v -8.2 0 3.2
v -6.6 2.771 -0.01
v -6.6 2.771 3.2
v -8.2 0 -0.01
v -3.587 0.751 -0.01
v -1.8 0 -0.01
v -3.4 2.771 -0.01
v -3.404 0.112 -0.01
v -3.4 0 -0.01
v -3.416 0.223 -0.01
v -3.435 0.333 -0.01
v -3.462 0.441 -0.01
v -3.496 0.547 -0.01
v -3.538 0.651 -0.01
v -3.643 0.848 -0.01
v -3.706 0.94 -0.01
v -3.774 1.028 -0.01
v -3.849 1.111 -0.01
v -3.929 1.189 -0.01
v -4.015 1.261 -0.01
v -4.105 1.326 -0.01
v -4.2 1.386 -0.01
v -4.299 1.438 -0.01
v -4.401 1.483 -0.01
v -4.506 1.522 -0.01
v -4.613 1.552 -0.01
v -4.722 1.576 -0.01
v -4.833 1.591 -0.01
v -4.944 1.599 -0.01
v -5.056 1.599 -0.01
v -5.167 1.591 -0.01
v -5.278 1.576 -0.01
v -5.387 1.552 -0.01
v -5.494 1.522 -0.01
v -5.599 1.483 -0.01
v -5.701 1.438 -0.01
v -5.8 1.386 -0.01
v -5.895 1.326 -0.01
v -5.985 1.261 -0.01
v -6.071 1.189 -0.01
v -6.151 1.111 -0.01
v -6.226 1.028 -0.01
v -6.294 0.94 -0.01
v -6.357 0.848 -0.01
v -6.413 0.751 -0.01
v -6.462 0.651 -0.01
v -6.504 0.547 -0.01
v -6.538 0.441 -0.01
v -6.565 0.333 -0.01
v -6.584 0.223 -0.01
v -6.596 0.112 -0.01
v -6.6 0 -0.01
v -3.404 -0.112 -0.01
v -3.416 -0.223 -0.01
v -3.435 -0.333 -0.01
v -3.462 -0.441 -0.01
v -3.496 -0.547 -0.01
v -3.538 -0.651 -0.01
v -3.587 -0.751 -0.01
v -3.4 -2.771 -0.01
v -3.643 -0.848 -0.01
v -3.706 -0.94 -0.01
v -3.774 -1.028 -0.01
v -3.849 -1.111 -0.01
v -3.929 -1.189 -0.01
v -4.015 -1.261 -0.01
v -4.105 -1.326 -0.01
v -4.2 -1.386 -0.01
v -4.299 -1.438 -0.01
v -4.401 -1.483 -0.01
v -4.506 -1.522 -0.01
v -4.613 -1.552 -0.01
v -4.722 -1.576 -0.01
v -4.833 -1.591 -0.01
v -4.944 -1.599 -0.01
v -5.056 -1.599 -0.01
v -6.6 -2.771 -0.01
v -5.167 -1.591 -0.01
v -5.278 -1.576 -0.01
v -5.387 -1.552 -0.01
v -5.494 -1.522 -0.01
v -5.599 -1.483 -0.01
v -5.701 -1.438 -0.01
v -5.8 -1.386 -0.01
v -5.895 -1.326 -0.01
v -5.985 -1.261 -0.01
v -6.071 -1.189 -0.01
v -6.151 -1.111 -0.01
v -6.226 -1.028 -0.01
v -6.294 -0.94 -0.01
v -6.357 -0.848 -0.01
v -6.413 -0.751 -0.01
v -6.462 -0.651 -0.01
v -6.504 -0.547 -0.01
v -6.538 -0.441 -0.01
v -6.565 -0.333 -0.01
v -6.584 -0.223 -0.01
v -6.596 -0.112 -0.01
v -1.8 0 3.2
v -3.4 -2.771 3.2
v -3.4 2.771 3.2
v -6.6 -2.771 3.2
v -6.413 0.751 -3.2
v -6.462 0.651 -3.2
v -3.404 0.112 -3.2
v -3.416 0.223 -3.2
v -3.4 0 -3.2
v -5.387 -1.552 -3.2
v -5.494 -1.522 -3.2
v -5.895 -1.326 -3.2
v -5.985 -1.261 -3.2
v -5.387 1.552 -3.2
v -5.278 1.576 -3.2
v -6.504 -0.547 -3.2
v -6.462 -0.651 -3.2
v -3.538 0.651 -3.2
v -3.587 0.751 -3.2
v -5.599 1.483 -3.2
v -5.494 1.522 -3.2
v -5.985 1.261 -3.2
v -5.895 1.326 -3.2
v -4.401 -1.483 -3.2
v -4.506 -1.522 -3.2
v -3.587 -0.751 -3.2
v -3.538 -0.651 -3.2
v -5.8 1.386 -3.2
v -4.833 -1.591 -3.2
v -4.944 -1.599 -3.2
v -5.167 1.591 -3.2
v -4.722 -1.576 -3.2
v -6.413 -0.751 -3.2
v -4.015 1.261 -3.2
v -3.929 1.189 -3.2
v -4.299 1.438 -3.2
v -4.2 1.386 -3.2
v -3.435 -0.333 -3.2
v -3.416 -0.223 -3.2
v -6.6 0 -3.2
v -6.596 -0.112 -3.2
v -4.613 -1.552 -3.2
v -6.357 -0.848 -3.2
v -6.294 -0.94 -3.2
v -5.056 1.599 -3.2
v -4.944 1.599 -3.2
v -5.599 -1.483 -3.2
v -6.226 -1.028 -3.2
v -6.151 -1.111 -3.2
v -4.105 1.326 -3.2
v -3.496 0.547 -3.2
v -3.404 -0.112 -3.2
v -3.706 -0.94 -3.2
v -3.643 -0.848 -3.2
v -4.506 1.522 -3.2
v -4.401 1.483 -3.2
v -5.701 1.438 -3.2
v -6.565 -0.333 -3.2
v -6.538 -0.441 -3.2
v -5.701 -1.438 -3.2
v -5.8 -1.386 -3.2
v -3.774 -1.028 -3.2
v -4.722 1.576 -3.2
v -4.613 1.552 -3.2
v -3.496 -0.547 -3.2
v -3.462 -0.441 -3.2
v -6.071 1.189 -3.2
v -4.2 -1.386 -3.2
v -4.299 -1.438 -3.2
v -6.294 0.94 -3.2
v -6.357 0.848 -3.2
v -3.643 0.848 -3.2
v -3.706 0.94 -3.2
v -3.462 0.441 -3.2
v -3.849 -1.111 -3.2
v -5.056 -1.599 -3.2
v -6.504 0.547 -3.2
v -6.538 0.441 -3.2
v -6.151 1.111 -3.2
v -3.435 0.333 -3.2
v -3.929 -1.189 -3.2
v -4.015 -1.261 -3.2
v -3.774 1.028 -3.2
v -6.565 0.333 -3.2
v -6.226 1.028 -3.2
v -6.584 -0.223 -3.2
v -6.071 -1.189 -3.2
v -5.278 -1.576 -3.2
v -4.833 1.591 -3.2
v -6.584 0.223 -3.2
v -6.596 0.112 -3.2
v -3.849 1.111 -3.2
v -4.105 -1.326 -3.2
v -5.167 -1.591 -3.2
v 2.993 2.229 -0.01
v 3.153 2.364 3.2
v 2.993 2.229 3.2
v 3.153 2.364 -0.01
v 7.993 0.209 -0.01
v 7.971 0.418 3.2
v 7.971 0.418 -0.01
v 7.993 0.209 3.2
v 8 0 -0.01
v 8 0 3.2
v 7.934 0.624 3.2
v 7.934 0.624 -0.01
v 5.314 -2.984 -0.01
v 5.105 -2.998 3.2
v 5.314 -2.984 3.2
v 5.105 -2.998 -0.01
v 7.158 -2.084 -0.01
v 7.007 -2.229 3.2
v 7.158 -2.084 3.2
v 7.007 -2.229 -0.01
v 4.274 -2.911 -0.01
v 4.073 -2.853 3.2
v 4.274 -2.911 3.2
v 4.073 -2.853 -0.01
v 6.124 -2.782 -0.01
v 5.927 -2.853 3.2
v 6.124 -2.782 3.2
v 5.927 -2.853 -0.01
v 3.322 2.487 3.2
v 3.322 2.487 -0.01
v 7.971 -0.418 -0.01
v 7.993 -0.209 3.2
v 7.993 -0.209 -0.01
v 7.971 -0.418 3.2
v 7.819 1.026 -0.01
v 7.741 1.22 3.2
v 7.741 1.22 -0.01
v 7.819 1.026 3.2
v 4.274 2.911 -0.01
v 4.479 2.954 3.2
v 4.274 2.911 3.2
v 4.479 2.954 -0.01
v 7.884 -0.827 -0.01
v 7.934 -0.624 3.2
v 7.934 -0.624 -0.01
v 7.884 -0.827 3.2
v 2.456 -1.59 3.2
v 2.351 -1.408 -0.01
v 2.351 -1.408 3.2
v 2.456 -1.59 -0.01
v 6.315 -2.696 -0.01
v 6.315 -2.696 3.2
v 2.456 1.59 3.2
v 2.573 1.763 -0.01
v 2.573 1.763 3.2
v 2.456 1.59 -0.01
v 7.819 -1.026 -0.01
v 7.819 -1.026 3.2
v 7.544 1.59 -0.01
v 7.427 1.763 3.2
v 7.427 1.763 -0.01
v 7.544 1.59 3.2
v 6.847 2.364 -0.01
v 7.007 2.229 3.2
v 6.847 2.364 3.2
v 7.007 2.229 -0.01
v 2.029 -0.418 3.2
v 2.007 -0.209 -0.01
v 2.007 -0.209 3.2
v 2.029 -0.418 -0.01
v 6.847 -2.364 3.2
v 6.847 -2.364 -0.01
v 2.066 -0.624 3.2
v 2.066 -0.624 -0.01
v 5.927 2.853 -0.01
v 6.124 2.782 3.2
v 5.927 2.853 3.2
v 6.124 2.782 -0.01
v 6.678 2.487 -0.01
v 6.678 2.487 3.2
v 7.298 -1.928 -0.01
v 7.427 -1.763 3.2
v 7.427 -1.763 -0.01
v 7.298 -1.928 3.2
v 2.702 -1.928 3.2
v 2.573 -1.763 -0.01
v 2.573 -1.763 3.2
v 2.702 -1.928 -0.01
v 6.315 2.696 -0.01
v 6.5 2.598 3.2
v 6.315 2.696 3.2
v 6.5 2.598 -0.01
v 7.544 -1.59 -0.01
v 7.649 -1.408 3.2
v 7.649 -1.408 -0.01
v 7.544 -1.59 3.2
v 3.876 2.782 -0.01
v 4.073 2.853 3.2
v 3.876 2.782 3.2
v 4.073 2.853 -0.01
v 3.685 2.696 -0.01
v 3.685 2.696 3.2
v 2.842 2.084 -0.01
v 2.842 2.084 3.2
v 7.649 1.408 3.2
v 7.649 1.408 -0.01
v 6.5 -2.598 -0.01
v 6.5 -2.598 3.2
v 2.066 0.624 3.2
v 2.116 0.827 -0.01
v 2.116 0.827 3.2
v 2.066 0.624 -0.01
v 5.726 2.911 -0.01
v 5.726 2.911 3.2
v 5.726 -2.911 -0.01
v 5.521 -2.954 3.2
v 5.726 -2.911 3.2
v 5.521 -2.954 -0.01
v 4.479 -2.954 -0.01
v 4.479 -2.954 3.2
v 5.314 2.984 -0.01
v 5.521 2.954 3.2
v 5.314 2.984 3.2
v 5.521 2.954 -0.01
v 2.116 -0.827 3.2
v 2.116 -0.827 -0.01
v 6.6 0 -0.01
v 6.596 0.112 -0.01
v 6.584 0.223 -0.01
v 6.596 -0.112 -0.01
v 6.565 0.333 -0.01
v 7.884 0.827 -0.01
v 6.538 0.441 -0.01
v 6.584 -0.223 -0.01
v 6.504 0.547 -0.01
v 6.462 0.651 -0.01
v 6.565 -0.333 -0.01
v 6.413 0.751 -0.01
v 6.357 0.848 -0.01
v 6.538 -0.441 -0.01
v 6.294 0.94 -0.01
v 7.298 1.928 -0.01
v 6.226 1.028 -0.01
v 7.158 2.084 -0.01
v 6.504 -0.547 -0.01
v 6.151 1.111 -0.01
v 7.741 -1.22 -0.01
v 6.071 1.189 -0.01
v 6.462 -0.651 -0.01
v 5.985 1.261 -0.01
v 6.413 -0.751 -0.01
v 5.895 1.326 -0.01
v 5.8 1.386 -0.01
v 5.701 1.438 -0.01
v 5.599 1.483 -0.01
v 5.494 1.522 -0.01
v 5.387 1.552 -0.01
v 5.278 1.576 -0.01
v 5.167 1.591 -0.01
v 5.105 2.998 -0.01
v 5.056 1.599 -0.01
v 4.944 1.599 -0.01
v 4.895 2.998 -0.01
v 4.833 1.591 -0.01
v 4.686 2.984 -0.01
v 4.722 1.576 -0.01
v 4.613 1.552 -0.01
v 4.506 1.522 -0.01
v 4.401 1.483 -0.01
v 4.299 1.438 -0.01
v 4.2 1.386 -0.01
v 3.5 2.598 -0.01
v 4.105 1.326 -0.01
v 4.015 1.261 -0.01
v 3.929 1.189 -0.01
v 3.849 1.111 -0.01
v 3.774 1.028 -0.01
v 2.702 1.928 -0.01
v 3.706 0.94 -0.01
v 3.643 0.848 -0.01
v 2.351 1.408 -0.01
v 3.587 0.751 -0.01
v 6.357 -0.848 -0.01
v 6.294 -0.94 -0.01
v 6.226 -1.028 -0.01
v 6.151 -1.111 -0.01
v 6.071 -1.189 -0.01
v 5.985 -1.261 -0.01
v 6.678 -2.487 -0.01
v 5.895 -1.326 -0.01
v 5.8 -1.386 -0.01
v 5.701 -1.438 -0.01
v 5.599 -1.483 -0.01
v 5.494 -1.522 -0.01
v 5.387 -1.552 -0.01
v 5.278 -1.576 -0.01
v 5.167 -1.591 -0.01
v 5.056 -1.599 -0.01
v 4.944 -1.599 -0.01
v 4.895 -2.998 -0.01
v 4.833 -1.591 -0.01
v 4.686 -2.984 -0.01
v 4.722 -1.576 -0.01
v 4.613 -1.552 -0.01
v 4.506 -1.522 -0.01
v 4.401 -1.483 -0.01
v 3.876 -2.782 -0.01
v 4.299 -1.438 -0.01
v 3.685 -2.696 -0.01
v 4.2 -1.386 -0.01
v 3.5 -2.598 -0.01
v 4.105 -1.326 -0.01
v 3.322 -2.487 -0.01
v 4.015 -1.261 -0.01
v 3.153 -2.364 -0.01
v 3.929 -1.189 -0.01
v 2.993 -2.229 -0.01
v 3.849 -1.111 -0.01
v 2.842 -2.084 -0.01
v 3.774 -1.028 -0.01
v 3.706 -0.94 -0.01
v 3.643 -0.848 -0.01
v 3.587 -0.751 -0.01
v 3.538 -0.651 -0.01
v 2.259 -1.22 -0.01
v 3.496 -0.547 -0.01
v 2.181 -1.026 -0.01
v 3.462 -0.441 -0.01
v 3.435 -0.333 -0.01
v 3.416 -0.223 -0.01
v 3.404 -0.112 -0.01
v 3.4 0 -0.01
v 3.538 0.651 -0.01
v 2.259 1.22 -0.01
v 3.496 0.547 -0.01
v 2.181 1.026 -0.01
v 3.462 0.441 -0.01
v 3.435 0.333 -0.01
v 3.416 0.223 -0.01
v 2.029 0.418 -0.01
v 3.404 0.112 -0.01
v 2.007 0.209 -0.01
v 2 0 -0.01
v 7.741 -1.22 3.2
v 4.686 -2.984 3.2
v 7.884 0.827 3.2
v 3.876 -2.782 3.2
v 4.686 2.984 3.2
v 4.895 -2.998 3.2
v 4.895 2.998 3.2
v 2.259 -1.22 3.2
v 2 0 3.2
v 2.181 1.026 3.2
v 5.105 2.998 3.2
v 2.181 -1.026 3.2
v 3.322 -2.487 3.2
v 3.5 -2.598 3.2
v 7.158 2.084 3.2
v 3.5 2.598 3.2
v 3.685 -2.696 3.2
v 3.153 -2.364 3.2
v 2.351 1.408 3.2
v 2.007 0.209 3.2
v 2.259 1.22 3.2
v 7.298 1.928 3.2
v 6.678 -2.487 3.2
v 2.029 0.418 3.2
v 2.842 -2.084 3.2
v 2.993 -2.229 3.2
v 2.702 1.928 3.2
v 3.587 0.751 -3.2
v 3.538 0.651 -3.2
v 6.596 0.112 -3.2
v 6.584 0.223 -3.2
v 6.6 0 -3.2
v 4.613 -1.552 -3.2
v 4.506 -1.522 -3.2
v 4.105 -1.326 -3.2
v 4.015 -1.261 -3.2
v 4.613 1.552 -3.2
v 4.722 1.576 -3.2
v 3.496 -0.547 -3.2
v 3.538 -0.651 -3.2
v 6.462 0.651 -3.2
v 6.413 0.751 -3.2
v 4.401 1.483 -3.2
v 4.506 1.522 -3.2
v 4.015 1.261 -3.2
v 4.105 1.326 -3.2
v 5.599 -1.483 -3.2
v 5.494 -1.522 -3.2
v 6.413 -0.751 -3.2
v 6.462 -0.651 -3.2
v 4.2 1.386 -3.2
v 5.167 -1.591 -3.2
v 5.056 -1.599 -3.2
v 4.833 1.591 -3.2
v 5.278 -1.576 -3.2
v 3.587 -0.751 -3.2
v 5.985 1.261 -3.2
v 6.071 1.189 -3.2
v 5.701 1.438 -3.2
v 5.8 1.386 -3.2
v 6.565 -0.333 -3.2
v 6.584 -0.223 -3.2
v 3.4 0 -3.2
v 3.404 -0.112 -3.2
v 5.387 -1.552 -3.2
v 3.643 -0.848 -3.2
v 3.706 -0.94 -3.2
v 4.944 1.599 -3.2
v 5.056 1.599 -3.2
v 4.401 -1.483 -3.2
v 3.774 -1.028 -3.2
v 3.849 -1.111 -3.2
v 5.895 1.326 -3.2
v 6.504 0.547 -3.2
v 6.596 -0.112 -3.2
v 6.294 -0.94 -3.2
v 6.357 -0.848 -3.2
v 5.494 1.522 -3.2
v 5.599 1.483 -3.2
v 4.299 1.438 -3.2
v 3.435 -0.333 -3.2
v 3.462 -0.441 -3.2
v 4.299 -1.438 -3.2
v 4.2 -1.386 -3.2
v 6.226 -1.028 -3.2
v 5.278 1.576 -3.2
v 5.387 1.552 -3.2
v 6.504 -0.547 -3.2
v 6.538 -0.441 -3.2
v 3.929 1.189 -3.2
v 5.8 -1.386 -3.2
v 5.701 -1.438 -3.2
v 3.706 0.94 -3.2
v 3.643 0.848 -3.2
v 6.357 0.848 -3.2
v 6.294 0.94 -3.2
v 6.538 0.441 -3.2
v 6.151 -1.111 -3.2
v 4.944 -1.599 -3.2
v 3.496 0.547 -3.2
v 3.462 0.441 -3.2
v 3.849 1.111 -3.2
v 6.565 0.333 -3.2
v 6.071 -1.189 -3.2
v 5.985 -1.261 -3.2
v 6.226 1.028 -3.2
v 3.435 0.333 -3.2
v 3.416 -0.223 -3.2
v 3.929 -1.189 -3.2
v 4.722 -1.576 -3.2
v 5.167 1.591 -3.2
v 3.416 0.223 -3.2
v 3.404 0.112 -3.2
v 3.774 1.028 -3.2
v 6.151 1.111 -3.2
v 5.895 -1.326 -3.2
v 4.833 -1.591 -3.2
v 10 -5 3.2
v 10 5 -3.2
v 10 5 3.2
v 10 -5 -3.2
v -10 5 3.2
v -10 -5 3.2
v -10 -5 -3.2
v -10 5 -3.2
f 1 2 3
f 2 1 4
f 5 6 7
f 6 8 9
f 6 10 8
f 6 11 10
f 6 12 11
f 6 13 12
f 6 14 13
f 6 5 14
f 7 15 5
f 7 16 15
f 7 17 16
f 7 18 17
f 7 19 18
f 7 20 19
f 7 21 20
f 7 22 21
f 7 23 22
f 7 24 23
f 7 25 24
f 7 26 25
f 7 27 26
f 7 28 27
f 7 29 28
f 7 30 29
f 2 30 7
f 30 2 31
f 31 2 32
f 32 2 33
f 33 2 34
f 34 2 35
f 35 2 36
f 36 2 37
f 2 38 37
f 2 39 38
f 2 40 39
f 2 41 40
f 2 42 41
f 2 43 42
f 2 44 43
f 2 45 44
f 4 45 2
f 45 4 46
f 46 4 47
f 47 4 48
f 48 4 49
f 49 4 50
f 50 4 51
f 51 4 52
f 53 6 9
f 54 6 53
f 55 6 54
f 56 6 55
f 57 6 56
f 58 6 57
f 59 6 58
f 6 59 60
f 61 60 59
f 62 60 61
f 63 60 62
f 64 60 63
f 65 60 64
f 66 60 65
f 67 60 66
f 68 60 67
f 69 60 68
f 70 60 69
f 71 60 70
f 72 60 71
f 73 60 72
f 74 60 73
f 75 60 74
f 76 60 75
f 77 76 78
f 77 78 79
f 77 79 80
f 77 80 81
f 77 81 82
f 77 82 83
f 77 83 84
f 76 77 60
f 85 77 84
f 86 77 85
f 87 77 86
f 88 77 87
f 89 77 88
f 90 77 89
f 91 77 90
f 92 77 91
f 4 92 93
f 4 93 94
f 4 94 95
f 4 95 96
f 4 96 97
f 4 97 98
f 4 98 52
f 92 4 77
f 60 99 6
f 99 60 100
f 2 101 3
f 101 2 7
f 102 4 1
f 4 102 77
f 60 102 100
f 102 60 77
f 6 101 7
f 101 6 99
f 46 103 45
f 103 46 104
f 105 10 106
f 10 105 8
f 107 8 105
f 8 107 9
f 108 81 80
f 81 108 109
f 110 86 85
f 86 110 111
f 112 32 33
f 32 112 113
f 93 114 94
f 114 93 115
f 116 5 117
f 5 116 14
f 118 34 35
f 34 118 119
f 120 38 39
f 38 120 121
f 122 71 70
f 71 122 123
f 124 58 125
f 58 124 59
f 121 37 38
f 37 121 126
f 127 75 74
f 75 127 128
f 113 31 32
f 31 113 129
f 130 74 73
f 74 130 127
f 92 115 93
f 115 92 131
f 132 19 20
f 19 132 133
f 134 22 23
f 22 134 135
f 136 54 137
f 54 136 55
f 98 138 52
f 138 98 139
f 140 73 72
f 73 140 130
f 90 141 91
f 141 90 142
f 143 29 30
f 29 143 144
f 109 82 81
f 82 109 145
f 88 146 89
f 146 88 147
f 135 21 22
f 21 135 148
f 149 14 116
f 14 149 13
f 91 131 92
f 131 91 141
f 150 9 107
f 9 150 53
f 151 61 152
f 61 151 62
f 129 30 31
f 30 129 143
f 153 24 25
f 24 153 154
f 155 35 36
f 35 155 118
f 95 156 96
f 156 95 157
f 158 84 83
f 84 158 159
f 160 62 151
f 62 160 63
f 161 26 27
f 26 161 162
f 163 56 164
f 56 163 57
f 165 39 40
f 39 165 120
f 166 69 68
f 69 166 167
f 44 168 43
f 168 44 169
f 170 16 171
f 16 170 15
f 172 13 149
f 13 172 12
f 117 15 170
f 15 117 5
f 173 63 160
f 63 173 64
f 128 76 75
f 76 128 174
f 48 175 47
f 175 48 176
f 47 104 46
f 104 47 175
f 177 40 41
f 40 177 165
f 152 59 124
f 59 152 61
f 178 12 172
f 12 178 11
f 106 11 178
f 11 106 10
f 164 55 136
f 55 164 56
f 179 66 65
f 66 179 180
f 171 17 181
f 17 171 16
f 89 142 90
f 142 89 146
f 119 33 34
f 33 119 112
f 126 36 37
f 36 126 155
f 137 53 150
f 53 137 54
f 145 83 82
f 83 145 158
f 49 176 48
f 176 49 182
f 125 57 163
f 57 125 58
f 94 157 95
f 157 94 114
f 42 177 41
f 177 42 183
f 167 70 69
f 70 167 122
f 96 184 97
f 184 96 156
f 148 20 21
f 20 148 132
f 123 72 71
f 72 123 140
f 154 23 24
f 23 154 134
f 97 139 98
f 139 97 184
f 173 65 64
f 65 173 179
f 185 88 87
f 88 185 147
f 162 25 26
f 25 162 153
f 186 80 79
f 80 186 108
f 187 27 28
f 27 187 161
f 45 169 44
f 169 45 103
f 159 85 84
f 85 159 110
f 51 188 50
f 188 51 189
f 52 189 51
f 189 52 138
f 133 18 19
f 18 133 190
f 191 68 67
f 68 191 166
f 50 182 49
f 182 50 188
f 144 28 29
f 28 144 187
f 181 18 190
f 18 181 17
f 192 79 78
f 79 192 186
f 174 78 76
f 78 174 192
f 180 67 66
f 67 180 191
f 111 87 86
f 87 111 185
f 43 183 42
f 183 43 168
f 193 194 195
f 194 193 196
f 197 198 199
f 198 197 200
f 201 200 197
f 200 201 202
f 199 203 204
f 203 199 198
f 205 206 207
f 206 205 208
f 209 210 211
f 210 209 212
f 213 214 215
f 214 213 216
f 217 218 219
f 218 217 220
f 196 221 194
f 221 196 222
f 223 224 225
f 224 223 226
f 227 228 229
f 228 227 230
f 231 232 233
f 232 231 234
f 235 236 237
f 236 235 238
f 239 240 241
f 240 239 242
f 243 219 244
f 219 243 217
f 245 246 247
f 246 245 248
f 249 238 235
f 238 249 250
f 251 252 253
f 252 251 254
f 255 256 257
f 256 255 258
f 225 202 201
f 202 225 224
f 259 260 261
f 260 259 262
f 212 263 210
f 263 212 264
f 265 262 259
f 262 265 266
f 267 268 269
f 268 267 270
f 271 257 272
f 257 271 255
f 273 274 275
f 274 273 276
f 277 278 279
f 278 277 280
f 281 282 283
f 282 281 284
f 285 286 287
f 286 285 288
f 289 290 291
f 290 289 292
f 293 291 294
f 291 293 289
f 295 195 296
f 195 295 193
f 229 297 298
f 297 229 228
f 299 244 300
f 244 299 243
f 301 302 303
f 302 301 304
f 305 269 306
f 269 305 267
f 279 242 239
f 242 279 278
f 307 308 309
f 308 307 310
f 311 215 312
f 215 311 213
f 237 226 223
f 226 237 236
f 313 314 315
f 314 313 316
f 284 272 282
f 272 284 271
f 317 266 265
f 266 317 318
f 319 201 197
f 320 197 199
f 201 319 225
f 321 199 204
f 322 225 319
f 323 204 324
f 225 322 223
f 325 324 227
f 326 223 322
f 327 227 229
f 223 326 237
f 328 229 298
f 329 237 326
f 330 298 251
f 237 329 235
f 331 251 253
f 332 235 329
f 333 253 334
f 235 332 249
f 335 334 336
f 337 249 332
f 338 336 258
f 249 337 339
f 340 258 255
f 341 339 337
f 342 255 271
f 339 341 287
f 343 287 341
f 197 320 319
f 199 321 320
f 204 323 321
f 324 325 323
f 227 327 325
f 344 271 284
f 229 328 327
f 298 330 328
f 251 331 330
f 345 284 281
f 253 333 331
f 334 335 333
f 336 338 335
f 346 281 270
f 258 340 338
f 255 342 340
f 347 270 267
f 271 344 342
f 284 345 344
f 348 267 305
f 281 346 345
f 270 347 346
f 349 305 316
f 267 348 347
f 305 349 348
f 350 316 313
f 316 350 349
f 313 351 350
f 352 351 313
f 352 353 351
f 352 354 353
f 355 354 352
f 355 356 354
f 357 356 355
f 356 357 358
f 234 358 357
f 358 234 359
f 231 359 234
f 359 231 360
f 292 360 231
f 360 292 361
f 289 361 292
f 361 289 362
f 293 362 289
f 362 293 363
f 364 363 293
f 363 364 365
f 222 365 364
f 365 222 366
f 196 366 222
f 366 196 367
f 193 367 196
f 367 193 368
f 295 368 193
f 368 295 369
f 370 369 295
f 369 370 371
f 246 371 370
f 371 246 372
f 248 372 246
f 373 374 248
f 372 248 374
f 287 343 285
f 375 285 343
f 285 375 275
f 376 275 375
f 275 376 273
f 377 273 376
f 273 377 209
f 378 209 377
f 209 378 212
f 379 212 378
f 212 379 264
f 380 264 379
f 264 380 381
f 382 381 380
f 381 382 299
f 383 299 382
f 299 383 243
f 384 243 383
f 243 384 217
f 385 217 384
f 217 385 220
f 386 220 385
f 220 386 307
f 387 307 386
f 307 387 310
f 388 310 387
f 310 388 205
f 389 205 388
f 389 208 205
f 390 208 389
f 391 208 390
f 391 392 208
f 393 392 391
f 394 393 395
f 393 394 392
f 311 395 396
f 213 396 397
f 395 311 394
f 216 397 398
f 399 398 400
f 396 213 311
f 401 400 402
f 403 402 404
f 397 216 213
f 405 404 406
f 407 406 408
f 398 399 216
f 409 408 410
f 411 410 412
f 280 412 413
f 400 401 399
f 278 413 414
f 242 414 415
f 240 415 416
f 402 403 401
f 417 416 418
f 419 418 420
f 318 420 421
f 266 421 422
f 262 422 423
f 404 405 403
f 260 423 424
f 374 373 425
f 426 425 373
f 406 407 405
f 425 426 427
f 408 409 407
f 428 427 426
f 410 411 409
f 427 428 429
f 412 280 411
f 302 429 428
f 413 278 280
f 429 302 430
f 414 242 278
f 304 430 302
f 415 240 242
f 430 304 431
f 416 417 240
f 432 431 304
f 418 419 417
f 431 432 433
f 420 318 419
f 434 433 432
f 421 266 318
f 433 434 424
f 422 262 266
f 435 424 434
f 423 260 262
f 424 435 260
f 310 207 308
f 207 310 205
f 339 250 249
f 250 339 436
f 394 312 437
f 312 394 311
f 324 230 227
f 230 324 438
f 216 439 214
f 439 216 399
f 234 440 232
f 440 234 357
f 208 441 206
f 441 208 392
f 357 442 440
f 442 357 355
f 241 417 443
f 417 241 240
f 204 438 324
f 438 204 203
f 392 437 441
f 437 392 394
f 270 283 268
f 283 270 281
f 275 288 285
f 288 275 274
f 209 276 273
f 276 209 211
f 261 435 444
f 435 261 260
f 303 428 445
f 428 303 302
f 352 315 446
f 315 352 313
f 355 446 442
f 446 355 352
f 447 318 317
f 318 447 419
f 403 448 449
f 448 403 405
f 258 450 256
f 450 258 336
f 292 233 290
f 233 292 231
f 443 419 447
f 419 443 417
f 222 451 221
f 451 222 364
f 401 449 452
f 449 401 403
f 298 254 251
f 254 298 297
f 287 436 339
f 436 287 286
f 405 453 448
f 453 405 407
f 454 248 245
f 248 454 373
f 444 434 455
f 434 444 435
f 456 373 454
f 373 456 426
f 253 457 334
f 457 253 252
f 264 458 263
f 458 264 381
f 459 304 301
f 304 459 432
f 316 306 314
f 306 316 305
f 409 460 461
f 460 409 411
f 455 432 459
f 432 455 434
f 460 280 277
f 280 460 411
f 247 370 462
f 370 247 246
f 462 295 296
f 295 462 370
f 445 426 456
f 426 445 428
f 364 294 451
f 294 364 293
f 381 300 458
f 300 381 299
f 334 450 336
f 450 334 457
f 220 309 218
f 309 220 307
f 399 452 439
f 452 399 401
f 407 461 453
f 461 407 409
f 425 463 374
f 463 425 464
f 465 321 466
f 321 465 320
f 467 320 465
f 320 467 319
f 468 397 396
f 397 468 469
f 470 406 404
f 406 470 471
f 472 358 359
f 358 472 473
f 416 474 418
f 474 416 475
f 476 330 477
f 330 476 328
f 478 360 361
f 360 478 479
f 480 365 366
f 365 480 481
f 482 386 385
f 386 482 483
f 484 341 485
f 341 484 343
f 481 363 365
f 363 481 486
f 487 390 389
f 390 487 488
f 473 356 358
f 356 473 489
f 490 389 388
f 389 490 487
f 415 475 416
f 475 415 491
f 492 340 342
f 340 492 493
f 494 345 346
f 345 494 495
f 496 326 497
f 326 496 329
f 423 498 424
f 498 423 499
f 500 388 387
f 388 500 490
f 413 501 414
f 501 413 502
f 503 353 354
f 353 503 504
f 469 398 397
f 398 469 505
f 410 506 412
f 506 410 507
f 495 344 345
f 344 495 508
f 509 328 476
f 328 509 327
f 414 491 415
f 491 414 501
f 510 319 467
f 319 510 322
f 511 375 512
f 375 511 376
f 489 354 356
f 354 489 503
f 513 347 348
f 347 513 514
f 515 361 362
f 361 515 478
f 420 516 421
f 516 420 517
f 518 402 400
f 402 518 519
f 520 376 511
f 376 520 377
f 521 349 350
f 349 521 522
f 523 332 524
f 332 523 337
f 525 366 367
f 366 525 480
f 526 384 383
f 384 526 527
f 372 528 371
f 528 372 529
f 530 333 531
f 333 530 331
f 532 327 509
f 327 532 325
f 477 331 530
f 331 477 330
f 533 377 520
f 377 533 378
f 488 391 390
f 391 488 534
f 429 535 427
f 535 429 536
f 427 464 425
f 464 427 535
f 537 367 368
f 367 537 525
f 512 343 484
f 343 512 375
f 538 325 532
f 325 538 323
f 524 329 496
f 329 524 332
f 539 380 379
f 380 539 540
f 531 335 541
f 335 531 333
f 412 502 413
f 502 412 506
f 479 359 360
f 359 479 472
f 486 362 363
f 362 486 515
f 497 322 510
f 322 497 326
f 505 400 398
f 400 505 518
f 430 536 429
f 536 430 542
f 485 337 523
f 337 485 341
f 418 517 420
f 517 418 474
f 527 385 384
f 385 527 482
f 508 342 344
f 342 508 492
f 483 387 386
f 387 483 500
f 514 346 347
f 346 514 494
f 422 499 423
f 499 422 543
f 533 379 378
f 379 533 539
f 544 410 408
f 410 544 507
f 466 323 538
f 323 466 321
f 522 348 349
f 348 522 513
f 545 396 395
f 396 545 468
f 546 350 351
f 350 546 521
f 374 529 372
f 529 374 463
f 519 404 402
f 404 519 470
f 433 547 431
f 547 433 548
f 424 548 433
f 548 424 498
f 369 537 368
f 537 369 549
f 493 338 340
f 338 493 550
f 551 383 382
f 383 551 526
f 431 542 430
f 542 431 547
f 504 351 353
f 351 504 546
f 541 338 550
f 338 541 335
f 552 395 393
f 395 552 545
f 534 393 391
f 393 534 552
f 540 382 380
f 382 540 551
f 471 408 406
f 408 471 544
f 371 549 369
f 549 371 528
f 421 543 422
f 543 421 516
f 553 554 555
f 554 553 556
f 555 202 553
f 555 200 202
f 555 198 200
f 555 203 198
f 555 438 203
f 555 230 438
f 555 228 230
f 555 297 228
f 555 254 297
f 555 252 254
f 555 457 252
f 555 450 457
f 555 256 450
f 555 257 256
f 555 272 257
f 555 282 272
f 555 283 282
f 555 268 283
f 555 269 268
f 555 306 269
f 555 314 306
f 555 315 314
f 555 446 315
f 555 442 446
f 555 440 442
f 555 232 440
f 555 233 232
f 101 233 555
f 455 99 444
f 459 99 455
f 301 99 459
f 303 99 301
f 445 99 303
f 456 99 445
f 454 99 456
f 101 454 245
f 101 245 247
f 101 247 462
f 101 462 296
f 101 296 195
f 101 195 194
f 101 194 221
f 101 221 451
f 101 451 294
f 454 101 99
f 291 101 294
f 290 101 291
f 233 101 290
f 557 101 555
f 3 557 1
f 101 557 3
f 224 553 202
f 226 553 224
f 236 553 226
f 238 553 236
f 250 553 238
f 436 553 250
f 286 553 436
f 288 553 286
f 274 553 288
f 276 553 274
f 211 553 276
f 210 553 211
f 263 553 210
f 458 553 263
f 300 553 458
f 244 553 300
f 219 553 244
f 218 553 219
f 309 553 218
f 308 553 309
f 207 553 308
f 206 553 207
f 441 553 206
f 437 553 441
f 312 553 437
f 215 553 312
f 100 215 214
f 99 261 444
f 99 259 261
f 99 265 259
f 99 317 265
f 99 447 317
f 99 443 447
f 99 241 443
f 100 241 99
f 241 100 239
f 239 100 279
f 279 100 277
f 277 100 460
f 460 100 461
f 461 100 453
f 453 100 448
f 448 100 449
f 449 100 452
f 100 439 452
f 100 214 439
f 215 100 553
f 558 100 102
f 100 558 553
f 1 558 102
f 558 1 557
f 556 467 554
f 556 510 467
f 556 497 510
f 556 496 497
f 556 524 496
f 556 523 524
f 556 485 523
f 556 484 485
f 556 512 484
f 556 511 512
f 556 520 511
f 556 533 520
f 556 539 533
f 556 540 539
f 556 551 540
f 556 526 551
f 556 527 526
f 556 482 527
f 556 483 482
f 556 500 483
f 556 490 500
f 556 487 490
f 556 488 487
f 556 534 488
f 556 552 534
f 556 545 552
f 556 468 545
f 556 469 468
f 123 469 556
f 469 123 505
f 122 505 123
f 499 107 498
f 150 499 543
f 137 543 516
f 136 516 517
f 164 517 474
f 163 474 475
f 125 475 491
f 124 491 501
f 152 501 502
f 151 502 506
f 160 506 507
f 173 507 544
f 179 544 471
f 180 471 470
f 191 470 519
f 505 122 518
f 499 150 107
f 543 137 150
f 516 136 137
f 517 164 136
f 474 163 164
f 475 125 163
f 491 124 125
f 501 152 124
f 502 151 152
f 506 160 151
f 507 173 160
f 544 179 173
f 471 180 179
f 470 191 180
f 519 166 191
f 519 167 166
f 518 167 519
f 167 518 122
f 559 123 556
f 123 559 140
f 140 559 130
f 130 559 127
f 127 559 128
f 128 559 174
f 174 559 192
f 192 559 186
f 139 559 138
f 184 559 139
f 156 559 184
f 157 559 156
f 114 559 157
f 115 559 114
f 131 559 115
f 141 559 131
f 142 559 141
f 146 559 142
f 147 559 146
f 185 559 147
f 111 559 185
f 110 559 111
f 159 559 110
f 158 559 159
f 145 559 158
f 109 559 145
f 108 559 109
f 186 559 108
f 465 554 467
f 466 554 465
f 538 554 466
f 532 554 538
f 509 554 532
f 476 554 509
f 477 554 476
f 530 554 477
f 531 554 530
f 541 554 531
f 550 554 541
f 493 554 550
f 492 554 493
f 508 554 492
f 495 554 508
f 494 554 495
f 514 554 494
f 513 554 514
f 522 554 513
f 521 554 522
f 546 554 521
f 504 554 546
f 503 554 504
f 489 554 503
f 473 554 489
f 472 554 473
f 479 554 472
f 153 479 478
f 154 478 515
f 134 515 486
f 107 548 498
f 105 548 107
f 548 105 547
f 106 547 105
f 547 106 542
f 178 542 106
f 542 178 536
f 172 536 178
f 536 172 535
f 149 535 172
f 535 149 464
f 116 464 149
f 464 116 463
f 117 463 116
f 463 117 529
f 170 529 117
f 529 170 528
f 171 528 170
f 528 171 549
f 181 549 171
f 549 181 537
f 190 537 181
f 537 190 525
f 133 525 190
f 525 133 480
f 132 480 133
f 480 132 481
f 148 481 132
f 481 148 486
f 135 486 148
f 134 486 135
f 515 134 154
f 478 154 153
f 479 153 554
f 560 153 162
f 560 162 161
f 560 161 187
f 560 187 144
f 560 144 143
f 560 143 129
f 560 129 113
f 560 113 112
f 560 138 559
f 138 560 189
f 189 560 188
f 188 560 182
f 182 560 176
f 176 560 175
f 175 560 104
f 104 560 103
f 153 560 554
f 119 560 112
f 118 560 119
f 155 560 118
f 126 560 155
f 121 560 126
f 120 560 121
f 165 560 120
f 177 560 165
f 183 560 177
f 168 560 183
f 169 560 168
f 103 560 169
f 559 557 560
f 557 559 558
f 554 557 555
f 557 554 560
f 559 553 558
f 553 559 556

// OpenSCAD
// file: ../../modules/hexagon.scad
module hexagon(r = 1) {
  polygon([
    [-1 * r, 0],
    [-.5 * r, r * sqrt(3) / 2],
    [.5 * r, r * sqrt(3) / 2],
    [1 * r, 0],
    [.5 * r, r * sqrt(3) / -2],
    [-.5 * r, r * sqrt(3) / -2],
  ]);
}
// file: _common.scad
$fa=4; // default minimum facet angle is now 0.5
$fs=0.05; // default minimum facet size is now 0.05 mm

include <../../modules/hexagon.scad>

height = 25;
totalWidth = 350;
wallThickness = 6.4;
baseThickness = 3.2;

// M3 screw
screwRad = 1.6;
screwHeadRad = 3;
nutRad = 3.2;
// main file
include <_common.scad>

difference() {
  cube([20, 10, wallThickness], center=true);

  translate([-5, 0, -20]) union() {
    translate([0, 0, 19.99]) linear_extrude(20) hexagon(r = nutRad);
    cylinder(h = 20, r = screwRad);
  }

  translate([5, 0, -20]) {
    translate([0, 0, 19.99]) cylinder(h = 20, r = screwHeadRad);
    cylinder(h = 20, r = screwRad);
  }
}
